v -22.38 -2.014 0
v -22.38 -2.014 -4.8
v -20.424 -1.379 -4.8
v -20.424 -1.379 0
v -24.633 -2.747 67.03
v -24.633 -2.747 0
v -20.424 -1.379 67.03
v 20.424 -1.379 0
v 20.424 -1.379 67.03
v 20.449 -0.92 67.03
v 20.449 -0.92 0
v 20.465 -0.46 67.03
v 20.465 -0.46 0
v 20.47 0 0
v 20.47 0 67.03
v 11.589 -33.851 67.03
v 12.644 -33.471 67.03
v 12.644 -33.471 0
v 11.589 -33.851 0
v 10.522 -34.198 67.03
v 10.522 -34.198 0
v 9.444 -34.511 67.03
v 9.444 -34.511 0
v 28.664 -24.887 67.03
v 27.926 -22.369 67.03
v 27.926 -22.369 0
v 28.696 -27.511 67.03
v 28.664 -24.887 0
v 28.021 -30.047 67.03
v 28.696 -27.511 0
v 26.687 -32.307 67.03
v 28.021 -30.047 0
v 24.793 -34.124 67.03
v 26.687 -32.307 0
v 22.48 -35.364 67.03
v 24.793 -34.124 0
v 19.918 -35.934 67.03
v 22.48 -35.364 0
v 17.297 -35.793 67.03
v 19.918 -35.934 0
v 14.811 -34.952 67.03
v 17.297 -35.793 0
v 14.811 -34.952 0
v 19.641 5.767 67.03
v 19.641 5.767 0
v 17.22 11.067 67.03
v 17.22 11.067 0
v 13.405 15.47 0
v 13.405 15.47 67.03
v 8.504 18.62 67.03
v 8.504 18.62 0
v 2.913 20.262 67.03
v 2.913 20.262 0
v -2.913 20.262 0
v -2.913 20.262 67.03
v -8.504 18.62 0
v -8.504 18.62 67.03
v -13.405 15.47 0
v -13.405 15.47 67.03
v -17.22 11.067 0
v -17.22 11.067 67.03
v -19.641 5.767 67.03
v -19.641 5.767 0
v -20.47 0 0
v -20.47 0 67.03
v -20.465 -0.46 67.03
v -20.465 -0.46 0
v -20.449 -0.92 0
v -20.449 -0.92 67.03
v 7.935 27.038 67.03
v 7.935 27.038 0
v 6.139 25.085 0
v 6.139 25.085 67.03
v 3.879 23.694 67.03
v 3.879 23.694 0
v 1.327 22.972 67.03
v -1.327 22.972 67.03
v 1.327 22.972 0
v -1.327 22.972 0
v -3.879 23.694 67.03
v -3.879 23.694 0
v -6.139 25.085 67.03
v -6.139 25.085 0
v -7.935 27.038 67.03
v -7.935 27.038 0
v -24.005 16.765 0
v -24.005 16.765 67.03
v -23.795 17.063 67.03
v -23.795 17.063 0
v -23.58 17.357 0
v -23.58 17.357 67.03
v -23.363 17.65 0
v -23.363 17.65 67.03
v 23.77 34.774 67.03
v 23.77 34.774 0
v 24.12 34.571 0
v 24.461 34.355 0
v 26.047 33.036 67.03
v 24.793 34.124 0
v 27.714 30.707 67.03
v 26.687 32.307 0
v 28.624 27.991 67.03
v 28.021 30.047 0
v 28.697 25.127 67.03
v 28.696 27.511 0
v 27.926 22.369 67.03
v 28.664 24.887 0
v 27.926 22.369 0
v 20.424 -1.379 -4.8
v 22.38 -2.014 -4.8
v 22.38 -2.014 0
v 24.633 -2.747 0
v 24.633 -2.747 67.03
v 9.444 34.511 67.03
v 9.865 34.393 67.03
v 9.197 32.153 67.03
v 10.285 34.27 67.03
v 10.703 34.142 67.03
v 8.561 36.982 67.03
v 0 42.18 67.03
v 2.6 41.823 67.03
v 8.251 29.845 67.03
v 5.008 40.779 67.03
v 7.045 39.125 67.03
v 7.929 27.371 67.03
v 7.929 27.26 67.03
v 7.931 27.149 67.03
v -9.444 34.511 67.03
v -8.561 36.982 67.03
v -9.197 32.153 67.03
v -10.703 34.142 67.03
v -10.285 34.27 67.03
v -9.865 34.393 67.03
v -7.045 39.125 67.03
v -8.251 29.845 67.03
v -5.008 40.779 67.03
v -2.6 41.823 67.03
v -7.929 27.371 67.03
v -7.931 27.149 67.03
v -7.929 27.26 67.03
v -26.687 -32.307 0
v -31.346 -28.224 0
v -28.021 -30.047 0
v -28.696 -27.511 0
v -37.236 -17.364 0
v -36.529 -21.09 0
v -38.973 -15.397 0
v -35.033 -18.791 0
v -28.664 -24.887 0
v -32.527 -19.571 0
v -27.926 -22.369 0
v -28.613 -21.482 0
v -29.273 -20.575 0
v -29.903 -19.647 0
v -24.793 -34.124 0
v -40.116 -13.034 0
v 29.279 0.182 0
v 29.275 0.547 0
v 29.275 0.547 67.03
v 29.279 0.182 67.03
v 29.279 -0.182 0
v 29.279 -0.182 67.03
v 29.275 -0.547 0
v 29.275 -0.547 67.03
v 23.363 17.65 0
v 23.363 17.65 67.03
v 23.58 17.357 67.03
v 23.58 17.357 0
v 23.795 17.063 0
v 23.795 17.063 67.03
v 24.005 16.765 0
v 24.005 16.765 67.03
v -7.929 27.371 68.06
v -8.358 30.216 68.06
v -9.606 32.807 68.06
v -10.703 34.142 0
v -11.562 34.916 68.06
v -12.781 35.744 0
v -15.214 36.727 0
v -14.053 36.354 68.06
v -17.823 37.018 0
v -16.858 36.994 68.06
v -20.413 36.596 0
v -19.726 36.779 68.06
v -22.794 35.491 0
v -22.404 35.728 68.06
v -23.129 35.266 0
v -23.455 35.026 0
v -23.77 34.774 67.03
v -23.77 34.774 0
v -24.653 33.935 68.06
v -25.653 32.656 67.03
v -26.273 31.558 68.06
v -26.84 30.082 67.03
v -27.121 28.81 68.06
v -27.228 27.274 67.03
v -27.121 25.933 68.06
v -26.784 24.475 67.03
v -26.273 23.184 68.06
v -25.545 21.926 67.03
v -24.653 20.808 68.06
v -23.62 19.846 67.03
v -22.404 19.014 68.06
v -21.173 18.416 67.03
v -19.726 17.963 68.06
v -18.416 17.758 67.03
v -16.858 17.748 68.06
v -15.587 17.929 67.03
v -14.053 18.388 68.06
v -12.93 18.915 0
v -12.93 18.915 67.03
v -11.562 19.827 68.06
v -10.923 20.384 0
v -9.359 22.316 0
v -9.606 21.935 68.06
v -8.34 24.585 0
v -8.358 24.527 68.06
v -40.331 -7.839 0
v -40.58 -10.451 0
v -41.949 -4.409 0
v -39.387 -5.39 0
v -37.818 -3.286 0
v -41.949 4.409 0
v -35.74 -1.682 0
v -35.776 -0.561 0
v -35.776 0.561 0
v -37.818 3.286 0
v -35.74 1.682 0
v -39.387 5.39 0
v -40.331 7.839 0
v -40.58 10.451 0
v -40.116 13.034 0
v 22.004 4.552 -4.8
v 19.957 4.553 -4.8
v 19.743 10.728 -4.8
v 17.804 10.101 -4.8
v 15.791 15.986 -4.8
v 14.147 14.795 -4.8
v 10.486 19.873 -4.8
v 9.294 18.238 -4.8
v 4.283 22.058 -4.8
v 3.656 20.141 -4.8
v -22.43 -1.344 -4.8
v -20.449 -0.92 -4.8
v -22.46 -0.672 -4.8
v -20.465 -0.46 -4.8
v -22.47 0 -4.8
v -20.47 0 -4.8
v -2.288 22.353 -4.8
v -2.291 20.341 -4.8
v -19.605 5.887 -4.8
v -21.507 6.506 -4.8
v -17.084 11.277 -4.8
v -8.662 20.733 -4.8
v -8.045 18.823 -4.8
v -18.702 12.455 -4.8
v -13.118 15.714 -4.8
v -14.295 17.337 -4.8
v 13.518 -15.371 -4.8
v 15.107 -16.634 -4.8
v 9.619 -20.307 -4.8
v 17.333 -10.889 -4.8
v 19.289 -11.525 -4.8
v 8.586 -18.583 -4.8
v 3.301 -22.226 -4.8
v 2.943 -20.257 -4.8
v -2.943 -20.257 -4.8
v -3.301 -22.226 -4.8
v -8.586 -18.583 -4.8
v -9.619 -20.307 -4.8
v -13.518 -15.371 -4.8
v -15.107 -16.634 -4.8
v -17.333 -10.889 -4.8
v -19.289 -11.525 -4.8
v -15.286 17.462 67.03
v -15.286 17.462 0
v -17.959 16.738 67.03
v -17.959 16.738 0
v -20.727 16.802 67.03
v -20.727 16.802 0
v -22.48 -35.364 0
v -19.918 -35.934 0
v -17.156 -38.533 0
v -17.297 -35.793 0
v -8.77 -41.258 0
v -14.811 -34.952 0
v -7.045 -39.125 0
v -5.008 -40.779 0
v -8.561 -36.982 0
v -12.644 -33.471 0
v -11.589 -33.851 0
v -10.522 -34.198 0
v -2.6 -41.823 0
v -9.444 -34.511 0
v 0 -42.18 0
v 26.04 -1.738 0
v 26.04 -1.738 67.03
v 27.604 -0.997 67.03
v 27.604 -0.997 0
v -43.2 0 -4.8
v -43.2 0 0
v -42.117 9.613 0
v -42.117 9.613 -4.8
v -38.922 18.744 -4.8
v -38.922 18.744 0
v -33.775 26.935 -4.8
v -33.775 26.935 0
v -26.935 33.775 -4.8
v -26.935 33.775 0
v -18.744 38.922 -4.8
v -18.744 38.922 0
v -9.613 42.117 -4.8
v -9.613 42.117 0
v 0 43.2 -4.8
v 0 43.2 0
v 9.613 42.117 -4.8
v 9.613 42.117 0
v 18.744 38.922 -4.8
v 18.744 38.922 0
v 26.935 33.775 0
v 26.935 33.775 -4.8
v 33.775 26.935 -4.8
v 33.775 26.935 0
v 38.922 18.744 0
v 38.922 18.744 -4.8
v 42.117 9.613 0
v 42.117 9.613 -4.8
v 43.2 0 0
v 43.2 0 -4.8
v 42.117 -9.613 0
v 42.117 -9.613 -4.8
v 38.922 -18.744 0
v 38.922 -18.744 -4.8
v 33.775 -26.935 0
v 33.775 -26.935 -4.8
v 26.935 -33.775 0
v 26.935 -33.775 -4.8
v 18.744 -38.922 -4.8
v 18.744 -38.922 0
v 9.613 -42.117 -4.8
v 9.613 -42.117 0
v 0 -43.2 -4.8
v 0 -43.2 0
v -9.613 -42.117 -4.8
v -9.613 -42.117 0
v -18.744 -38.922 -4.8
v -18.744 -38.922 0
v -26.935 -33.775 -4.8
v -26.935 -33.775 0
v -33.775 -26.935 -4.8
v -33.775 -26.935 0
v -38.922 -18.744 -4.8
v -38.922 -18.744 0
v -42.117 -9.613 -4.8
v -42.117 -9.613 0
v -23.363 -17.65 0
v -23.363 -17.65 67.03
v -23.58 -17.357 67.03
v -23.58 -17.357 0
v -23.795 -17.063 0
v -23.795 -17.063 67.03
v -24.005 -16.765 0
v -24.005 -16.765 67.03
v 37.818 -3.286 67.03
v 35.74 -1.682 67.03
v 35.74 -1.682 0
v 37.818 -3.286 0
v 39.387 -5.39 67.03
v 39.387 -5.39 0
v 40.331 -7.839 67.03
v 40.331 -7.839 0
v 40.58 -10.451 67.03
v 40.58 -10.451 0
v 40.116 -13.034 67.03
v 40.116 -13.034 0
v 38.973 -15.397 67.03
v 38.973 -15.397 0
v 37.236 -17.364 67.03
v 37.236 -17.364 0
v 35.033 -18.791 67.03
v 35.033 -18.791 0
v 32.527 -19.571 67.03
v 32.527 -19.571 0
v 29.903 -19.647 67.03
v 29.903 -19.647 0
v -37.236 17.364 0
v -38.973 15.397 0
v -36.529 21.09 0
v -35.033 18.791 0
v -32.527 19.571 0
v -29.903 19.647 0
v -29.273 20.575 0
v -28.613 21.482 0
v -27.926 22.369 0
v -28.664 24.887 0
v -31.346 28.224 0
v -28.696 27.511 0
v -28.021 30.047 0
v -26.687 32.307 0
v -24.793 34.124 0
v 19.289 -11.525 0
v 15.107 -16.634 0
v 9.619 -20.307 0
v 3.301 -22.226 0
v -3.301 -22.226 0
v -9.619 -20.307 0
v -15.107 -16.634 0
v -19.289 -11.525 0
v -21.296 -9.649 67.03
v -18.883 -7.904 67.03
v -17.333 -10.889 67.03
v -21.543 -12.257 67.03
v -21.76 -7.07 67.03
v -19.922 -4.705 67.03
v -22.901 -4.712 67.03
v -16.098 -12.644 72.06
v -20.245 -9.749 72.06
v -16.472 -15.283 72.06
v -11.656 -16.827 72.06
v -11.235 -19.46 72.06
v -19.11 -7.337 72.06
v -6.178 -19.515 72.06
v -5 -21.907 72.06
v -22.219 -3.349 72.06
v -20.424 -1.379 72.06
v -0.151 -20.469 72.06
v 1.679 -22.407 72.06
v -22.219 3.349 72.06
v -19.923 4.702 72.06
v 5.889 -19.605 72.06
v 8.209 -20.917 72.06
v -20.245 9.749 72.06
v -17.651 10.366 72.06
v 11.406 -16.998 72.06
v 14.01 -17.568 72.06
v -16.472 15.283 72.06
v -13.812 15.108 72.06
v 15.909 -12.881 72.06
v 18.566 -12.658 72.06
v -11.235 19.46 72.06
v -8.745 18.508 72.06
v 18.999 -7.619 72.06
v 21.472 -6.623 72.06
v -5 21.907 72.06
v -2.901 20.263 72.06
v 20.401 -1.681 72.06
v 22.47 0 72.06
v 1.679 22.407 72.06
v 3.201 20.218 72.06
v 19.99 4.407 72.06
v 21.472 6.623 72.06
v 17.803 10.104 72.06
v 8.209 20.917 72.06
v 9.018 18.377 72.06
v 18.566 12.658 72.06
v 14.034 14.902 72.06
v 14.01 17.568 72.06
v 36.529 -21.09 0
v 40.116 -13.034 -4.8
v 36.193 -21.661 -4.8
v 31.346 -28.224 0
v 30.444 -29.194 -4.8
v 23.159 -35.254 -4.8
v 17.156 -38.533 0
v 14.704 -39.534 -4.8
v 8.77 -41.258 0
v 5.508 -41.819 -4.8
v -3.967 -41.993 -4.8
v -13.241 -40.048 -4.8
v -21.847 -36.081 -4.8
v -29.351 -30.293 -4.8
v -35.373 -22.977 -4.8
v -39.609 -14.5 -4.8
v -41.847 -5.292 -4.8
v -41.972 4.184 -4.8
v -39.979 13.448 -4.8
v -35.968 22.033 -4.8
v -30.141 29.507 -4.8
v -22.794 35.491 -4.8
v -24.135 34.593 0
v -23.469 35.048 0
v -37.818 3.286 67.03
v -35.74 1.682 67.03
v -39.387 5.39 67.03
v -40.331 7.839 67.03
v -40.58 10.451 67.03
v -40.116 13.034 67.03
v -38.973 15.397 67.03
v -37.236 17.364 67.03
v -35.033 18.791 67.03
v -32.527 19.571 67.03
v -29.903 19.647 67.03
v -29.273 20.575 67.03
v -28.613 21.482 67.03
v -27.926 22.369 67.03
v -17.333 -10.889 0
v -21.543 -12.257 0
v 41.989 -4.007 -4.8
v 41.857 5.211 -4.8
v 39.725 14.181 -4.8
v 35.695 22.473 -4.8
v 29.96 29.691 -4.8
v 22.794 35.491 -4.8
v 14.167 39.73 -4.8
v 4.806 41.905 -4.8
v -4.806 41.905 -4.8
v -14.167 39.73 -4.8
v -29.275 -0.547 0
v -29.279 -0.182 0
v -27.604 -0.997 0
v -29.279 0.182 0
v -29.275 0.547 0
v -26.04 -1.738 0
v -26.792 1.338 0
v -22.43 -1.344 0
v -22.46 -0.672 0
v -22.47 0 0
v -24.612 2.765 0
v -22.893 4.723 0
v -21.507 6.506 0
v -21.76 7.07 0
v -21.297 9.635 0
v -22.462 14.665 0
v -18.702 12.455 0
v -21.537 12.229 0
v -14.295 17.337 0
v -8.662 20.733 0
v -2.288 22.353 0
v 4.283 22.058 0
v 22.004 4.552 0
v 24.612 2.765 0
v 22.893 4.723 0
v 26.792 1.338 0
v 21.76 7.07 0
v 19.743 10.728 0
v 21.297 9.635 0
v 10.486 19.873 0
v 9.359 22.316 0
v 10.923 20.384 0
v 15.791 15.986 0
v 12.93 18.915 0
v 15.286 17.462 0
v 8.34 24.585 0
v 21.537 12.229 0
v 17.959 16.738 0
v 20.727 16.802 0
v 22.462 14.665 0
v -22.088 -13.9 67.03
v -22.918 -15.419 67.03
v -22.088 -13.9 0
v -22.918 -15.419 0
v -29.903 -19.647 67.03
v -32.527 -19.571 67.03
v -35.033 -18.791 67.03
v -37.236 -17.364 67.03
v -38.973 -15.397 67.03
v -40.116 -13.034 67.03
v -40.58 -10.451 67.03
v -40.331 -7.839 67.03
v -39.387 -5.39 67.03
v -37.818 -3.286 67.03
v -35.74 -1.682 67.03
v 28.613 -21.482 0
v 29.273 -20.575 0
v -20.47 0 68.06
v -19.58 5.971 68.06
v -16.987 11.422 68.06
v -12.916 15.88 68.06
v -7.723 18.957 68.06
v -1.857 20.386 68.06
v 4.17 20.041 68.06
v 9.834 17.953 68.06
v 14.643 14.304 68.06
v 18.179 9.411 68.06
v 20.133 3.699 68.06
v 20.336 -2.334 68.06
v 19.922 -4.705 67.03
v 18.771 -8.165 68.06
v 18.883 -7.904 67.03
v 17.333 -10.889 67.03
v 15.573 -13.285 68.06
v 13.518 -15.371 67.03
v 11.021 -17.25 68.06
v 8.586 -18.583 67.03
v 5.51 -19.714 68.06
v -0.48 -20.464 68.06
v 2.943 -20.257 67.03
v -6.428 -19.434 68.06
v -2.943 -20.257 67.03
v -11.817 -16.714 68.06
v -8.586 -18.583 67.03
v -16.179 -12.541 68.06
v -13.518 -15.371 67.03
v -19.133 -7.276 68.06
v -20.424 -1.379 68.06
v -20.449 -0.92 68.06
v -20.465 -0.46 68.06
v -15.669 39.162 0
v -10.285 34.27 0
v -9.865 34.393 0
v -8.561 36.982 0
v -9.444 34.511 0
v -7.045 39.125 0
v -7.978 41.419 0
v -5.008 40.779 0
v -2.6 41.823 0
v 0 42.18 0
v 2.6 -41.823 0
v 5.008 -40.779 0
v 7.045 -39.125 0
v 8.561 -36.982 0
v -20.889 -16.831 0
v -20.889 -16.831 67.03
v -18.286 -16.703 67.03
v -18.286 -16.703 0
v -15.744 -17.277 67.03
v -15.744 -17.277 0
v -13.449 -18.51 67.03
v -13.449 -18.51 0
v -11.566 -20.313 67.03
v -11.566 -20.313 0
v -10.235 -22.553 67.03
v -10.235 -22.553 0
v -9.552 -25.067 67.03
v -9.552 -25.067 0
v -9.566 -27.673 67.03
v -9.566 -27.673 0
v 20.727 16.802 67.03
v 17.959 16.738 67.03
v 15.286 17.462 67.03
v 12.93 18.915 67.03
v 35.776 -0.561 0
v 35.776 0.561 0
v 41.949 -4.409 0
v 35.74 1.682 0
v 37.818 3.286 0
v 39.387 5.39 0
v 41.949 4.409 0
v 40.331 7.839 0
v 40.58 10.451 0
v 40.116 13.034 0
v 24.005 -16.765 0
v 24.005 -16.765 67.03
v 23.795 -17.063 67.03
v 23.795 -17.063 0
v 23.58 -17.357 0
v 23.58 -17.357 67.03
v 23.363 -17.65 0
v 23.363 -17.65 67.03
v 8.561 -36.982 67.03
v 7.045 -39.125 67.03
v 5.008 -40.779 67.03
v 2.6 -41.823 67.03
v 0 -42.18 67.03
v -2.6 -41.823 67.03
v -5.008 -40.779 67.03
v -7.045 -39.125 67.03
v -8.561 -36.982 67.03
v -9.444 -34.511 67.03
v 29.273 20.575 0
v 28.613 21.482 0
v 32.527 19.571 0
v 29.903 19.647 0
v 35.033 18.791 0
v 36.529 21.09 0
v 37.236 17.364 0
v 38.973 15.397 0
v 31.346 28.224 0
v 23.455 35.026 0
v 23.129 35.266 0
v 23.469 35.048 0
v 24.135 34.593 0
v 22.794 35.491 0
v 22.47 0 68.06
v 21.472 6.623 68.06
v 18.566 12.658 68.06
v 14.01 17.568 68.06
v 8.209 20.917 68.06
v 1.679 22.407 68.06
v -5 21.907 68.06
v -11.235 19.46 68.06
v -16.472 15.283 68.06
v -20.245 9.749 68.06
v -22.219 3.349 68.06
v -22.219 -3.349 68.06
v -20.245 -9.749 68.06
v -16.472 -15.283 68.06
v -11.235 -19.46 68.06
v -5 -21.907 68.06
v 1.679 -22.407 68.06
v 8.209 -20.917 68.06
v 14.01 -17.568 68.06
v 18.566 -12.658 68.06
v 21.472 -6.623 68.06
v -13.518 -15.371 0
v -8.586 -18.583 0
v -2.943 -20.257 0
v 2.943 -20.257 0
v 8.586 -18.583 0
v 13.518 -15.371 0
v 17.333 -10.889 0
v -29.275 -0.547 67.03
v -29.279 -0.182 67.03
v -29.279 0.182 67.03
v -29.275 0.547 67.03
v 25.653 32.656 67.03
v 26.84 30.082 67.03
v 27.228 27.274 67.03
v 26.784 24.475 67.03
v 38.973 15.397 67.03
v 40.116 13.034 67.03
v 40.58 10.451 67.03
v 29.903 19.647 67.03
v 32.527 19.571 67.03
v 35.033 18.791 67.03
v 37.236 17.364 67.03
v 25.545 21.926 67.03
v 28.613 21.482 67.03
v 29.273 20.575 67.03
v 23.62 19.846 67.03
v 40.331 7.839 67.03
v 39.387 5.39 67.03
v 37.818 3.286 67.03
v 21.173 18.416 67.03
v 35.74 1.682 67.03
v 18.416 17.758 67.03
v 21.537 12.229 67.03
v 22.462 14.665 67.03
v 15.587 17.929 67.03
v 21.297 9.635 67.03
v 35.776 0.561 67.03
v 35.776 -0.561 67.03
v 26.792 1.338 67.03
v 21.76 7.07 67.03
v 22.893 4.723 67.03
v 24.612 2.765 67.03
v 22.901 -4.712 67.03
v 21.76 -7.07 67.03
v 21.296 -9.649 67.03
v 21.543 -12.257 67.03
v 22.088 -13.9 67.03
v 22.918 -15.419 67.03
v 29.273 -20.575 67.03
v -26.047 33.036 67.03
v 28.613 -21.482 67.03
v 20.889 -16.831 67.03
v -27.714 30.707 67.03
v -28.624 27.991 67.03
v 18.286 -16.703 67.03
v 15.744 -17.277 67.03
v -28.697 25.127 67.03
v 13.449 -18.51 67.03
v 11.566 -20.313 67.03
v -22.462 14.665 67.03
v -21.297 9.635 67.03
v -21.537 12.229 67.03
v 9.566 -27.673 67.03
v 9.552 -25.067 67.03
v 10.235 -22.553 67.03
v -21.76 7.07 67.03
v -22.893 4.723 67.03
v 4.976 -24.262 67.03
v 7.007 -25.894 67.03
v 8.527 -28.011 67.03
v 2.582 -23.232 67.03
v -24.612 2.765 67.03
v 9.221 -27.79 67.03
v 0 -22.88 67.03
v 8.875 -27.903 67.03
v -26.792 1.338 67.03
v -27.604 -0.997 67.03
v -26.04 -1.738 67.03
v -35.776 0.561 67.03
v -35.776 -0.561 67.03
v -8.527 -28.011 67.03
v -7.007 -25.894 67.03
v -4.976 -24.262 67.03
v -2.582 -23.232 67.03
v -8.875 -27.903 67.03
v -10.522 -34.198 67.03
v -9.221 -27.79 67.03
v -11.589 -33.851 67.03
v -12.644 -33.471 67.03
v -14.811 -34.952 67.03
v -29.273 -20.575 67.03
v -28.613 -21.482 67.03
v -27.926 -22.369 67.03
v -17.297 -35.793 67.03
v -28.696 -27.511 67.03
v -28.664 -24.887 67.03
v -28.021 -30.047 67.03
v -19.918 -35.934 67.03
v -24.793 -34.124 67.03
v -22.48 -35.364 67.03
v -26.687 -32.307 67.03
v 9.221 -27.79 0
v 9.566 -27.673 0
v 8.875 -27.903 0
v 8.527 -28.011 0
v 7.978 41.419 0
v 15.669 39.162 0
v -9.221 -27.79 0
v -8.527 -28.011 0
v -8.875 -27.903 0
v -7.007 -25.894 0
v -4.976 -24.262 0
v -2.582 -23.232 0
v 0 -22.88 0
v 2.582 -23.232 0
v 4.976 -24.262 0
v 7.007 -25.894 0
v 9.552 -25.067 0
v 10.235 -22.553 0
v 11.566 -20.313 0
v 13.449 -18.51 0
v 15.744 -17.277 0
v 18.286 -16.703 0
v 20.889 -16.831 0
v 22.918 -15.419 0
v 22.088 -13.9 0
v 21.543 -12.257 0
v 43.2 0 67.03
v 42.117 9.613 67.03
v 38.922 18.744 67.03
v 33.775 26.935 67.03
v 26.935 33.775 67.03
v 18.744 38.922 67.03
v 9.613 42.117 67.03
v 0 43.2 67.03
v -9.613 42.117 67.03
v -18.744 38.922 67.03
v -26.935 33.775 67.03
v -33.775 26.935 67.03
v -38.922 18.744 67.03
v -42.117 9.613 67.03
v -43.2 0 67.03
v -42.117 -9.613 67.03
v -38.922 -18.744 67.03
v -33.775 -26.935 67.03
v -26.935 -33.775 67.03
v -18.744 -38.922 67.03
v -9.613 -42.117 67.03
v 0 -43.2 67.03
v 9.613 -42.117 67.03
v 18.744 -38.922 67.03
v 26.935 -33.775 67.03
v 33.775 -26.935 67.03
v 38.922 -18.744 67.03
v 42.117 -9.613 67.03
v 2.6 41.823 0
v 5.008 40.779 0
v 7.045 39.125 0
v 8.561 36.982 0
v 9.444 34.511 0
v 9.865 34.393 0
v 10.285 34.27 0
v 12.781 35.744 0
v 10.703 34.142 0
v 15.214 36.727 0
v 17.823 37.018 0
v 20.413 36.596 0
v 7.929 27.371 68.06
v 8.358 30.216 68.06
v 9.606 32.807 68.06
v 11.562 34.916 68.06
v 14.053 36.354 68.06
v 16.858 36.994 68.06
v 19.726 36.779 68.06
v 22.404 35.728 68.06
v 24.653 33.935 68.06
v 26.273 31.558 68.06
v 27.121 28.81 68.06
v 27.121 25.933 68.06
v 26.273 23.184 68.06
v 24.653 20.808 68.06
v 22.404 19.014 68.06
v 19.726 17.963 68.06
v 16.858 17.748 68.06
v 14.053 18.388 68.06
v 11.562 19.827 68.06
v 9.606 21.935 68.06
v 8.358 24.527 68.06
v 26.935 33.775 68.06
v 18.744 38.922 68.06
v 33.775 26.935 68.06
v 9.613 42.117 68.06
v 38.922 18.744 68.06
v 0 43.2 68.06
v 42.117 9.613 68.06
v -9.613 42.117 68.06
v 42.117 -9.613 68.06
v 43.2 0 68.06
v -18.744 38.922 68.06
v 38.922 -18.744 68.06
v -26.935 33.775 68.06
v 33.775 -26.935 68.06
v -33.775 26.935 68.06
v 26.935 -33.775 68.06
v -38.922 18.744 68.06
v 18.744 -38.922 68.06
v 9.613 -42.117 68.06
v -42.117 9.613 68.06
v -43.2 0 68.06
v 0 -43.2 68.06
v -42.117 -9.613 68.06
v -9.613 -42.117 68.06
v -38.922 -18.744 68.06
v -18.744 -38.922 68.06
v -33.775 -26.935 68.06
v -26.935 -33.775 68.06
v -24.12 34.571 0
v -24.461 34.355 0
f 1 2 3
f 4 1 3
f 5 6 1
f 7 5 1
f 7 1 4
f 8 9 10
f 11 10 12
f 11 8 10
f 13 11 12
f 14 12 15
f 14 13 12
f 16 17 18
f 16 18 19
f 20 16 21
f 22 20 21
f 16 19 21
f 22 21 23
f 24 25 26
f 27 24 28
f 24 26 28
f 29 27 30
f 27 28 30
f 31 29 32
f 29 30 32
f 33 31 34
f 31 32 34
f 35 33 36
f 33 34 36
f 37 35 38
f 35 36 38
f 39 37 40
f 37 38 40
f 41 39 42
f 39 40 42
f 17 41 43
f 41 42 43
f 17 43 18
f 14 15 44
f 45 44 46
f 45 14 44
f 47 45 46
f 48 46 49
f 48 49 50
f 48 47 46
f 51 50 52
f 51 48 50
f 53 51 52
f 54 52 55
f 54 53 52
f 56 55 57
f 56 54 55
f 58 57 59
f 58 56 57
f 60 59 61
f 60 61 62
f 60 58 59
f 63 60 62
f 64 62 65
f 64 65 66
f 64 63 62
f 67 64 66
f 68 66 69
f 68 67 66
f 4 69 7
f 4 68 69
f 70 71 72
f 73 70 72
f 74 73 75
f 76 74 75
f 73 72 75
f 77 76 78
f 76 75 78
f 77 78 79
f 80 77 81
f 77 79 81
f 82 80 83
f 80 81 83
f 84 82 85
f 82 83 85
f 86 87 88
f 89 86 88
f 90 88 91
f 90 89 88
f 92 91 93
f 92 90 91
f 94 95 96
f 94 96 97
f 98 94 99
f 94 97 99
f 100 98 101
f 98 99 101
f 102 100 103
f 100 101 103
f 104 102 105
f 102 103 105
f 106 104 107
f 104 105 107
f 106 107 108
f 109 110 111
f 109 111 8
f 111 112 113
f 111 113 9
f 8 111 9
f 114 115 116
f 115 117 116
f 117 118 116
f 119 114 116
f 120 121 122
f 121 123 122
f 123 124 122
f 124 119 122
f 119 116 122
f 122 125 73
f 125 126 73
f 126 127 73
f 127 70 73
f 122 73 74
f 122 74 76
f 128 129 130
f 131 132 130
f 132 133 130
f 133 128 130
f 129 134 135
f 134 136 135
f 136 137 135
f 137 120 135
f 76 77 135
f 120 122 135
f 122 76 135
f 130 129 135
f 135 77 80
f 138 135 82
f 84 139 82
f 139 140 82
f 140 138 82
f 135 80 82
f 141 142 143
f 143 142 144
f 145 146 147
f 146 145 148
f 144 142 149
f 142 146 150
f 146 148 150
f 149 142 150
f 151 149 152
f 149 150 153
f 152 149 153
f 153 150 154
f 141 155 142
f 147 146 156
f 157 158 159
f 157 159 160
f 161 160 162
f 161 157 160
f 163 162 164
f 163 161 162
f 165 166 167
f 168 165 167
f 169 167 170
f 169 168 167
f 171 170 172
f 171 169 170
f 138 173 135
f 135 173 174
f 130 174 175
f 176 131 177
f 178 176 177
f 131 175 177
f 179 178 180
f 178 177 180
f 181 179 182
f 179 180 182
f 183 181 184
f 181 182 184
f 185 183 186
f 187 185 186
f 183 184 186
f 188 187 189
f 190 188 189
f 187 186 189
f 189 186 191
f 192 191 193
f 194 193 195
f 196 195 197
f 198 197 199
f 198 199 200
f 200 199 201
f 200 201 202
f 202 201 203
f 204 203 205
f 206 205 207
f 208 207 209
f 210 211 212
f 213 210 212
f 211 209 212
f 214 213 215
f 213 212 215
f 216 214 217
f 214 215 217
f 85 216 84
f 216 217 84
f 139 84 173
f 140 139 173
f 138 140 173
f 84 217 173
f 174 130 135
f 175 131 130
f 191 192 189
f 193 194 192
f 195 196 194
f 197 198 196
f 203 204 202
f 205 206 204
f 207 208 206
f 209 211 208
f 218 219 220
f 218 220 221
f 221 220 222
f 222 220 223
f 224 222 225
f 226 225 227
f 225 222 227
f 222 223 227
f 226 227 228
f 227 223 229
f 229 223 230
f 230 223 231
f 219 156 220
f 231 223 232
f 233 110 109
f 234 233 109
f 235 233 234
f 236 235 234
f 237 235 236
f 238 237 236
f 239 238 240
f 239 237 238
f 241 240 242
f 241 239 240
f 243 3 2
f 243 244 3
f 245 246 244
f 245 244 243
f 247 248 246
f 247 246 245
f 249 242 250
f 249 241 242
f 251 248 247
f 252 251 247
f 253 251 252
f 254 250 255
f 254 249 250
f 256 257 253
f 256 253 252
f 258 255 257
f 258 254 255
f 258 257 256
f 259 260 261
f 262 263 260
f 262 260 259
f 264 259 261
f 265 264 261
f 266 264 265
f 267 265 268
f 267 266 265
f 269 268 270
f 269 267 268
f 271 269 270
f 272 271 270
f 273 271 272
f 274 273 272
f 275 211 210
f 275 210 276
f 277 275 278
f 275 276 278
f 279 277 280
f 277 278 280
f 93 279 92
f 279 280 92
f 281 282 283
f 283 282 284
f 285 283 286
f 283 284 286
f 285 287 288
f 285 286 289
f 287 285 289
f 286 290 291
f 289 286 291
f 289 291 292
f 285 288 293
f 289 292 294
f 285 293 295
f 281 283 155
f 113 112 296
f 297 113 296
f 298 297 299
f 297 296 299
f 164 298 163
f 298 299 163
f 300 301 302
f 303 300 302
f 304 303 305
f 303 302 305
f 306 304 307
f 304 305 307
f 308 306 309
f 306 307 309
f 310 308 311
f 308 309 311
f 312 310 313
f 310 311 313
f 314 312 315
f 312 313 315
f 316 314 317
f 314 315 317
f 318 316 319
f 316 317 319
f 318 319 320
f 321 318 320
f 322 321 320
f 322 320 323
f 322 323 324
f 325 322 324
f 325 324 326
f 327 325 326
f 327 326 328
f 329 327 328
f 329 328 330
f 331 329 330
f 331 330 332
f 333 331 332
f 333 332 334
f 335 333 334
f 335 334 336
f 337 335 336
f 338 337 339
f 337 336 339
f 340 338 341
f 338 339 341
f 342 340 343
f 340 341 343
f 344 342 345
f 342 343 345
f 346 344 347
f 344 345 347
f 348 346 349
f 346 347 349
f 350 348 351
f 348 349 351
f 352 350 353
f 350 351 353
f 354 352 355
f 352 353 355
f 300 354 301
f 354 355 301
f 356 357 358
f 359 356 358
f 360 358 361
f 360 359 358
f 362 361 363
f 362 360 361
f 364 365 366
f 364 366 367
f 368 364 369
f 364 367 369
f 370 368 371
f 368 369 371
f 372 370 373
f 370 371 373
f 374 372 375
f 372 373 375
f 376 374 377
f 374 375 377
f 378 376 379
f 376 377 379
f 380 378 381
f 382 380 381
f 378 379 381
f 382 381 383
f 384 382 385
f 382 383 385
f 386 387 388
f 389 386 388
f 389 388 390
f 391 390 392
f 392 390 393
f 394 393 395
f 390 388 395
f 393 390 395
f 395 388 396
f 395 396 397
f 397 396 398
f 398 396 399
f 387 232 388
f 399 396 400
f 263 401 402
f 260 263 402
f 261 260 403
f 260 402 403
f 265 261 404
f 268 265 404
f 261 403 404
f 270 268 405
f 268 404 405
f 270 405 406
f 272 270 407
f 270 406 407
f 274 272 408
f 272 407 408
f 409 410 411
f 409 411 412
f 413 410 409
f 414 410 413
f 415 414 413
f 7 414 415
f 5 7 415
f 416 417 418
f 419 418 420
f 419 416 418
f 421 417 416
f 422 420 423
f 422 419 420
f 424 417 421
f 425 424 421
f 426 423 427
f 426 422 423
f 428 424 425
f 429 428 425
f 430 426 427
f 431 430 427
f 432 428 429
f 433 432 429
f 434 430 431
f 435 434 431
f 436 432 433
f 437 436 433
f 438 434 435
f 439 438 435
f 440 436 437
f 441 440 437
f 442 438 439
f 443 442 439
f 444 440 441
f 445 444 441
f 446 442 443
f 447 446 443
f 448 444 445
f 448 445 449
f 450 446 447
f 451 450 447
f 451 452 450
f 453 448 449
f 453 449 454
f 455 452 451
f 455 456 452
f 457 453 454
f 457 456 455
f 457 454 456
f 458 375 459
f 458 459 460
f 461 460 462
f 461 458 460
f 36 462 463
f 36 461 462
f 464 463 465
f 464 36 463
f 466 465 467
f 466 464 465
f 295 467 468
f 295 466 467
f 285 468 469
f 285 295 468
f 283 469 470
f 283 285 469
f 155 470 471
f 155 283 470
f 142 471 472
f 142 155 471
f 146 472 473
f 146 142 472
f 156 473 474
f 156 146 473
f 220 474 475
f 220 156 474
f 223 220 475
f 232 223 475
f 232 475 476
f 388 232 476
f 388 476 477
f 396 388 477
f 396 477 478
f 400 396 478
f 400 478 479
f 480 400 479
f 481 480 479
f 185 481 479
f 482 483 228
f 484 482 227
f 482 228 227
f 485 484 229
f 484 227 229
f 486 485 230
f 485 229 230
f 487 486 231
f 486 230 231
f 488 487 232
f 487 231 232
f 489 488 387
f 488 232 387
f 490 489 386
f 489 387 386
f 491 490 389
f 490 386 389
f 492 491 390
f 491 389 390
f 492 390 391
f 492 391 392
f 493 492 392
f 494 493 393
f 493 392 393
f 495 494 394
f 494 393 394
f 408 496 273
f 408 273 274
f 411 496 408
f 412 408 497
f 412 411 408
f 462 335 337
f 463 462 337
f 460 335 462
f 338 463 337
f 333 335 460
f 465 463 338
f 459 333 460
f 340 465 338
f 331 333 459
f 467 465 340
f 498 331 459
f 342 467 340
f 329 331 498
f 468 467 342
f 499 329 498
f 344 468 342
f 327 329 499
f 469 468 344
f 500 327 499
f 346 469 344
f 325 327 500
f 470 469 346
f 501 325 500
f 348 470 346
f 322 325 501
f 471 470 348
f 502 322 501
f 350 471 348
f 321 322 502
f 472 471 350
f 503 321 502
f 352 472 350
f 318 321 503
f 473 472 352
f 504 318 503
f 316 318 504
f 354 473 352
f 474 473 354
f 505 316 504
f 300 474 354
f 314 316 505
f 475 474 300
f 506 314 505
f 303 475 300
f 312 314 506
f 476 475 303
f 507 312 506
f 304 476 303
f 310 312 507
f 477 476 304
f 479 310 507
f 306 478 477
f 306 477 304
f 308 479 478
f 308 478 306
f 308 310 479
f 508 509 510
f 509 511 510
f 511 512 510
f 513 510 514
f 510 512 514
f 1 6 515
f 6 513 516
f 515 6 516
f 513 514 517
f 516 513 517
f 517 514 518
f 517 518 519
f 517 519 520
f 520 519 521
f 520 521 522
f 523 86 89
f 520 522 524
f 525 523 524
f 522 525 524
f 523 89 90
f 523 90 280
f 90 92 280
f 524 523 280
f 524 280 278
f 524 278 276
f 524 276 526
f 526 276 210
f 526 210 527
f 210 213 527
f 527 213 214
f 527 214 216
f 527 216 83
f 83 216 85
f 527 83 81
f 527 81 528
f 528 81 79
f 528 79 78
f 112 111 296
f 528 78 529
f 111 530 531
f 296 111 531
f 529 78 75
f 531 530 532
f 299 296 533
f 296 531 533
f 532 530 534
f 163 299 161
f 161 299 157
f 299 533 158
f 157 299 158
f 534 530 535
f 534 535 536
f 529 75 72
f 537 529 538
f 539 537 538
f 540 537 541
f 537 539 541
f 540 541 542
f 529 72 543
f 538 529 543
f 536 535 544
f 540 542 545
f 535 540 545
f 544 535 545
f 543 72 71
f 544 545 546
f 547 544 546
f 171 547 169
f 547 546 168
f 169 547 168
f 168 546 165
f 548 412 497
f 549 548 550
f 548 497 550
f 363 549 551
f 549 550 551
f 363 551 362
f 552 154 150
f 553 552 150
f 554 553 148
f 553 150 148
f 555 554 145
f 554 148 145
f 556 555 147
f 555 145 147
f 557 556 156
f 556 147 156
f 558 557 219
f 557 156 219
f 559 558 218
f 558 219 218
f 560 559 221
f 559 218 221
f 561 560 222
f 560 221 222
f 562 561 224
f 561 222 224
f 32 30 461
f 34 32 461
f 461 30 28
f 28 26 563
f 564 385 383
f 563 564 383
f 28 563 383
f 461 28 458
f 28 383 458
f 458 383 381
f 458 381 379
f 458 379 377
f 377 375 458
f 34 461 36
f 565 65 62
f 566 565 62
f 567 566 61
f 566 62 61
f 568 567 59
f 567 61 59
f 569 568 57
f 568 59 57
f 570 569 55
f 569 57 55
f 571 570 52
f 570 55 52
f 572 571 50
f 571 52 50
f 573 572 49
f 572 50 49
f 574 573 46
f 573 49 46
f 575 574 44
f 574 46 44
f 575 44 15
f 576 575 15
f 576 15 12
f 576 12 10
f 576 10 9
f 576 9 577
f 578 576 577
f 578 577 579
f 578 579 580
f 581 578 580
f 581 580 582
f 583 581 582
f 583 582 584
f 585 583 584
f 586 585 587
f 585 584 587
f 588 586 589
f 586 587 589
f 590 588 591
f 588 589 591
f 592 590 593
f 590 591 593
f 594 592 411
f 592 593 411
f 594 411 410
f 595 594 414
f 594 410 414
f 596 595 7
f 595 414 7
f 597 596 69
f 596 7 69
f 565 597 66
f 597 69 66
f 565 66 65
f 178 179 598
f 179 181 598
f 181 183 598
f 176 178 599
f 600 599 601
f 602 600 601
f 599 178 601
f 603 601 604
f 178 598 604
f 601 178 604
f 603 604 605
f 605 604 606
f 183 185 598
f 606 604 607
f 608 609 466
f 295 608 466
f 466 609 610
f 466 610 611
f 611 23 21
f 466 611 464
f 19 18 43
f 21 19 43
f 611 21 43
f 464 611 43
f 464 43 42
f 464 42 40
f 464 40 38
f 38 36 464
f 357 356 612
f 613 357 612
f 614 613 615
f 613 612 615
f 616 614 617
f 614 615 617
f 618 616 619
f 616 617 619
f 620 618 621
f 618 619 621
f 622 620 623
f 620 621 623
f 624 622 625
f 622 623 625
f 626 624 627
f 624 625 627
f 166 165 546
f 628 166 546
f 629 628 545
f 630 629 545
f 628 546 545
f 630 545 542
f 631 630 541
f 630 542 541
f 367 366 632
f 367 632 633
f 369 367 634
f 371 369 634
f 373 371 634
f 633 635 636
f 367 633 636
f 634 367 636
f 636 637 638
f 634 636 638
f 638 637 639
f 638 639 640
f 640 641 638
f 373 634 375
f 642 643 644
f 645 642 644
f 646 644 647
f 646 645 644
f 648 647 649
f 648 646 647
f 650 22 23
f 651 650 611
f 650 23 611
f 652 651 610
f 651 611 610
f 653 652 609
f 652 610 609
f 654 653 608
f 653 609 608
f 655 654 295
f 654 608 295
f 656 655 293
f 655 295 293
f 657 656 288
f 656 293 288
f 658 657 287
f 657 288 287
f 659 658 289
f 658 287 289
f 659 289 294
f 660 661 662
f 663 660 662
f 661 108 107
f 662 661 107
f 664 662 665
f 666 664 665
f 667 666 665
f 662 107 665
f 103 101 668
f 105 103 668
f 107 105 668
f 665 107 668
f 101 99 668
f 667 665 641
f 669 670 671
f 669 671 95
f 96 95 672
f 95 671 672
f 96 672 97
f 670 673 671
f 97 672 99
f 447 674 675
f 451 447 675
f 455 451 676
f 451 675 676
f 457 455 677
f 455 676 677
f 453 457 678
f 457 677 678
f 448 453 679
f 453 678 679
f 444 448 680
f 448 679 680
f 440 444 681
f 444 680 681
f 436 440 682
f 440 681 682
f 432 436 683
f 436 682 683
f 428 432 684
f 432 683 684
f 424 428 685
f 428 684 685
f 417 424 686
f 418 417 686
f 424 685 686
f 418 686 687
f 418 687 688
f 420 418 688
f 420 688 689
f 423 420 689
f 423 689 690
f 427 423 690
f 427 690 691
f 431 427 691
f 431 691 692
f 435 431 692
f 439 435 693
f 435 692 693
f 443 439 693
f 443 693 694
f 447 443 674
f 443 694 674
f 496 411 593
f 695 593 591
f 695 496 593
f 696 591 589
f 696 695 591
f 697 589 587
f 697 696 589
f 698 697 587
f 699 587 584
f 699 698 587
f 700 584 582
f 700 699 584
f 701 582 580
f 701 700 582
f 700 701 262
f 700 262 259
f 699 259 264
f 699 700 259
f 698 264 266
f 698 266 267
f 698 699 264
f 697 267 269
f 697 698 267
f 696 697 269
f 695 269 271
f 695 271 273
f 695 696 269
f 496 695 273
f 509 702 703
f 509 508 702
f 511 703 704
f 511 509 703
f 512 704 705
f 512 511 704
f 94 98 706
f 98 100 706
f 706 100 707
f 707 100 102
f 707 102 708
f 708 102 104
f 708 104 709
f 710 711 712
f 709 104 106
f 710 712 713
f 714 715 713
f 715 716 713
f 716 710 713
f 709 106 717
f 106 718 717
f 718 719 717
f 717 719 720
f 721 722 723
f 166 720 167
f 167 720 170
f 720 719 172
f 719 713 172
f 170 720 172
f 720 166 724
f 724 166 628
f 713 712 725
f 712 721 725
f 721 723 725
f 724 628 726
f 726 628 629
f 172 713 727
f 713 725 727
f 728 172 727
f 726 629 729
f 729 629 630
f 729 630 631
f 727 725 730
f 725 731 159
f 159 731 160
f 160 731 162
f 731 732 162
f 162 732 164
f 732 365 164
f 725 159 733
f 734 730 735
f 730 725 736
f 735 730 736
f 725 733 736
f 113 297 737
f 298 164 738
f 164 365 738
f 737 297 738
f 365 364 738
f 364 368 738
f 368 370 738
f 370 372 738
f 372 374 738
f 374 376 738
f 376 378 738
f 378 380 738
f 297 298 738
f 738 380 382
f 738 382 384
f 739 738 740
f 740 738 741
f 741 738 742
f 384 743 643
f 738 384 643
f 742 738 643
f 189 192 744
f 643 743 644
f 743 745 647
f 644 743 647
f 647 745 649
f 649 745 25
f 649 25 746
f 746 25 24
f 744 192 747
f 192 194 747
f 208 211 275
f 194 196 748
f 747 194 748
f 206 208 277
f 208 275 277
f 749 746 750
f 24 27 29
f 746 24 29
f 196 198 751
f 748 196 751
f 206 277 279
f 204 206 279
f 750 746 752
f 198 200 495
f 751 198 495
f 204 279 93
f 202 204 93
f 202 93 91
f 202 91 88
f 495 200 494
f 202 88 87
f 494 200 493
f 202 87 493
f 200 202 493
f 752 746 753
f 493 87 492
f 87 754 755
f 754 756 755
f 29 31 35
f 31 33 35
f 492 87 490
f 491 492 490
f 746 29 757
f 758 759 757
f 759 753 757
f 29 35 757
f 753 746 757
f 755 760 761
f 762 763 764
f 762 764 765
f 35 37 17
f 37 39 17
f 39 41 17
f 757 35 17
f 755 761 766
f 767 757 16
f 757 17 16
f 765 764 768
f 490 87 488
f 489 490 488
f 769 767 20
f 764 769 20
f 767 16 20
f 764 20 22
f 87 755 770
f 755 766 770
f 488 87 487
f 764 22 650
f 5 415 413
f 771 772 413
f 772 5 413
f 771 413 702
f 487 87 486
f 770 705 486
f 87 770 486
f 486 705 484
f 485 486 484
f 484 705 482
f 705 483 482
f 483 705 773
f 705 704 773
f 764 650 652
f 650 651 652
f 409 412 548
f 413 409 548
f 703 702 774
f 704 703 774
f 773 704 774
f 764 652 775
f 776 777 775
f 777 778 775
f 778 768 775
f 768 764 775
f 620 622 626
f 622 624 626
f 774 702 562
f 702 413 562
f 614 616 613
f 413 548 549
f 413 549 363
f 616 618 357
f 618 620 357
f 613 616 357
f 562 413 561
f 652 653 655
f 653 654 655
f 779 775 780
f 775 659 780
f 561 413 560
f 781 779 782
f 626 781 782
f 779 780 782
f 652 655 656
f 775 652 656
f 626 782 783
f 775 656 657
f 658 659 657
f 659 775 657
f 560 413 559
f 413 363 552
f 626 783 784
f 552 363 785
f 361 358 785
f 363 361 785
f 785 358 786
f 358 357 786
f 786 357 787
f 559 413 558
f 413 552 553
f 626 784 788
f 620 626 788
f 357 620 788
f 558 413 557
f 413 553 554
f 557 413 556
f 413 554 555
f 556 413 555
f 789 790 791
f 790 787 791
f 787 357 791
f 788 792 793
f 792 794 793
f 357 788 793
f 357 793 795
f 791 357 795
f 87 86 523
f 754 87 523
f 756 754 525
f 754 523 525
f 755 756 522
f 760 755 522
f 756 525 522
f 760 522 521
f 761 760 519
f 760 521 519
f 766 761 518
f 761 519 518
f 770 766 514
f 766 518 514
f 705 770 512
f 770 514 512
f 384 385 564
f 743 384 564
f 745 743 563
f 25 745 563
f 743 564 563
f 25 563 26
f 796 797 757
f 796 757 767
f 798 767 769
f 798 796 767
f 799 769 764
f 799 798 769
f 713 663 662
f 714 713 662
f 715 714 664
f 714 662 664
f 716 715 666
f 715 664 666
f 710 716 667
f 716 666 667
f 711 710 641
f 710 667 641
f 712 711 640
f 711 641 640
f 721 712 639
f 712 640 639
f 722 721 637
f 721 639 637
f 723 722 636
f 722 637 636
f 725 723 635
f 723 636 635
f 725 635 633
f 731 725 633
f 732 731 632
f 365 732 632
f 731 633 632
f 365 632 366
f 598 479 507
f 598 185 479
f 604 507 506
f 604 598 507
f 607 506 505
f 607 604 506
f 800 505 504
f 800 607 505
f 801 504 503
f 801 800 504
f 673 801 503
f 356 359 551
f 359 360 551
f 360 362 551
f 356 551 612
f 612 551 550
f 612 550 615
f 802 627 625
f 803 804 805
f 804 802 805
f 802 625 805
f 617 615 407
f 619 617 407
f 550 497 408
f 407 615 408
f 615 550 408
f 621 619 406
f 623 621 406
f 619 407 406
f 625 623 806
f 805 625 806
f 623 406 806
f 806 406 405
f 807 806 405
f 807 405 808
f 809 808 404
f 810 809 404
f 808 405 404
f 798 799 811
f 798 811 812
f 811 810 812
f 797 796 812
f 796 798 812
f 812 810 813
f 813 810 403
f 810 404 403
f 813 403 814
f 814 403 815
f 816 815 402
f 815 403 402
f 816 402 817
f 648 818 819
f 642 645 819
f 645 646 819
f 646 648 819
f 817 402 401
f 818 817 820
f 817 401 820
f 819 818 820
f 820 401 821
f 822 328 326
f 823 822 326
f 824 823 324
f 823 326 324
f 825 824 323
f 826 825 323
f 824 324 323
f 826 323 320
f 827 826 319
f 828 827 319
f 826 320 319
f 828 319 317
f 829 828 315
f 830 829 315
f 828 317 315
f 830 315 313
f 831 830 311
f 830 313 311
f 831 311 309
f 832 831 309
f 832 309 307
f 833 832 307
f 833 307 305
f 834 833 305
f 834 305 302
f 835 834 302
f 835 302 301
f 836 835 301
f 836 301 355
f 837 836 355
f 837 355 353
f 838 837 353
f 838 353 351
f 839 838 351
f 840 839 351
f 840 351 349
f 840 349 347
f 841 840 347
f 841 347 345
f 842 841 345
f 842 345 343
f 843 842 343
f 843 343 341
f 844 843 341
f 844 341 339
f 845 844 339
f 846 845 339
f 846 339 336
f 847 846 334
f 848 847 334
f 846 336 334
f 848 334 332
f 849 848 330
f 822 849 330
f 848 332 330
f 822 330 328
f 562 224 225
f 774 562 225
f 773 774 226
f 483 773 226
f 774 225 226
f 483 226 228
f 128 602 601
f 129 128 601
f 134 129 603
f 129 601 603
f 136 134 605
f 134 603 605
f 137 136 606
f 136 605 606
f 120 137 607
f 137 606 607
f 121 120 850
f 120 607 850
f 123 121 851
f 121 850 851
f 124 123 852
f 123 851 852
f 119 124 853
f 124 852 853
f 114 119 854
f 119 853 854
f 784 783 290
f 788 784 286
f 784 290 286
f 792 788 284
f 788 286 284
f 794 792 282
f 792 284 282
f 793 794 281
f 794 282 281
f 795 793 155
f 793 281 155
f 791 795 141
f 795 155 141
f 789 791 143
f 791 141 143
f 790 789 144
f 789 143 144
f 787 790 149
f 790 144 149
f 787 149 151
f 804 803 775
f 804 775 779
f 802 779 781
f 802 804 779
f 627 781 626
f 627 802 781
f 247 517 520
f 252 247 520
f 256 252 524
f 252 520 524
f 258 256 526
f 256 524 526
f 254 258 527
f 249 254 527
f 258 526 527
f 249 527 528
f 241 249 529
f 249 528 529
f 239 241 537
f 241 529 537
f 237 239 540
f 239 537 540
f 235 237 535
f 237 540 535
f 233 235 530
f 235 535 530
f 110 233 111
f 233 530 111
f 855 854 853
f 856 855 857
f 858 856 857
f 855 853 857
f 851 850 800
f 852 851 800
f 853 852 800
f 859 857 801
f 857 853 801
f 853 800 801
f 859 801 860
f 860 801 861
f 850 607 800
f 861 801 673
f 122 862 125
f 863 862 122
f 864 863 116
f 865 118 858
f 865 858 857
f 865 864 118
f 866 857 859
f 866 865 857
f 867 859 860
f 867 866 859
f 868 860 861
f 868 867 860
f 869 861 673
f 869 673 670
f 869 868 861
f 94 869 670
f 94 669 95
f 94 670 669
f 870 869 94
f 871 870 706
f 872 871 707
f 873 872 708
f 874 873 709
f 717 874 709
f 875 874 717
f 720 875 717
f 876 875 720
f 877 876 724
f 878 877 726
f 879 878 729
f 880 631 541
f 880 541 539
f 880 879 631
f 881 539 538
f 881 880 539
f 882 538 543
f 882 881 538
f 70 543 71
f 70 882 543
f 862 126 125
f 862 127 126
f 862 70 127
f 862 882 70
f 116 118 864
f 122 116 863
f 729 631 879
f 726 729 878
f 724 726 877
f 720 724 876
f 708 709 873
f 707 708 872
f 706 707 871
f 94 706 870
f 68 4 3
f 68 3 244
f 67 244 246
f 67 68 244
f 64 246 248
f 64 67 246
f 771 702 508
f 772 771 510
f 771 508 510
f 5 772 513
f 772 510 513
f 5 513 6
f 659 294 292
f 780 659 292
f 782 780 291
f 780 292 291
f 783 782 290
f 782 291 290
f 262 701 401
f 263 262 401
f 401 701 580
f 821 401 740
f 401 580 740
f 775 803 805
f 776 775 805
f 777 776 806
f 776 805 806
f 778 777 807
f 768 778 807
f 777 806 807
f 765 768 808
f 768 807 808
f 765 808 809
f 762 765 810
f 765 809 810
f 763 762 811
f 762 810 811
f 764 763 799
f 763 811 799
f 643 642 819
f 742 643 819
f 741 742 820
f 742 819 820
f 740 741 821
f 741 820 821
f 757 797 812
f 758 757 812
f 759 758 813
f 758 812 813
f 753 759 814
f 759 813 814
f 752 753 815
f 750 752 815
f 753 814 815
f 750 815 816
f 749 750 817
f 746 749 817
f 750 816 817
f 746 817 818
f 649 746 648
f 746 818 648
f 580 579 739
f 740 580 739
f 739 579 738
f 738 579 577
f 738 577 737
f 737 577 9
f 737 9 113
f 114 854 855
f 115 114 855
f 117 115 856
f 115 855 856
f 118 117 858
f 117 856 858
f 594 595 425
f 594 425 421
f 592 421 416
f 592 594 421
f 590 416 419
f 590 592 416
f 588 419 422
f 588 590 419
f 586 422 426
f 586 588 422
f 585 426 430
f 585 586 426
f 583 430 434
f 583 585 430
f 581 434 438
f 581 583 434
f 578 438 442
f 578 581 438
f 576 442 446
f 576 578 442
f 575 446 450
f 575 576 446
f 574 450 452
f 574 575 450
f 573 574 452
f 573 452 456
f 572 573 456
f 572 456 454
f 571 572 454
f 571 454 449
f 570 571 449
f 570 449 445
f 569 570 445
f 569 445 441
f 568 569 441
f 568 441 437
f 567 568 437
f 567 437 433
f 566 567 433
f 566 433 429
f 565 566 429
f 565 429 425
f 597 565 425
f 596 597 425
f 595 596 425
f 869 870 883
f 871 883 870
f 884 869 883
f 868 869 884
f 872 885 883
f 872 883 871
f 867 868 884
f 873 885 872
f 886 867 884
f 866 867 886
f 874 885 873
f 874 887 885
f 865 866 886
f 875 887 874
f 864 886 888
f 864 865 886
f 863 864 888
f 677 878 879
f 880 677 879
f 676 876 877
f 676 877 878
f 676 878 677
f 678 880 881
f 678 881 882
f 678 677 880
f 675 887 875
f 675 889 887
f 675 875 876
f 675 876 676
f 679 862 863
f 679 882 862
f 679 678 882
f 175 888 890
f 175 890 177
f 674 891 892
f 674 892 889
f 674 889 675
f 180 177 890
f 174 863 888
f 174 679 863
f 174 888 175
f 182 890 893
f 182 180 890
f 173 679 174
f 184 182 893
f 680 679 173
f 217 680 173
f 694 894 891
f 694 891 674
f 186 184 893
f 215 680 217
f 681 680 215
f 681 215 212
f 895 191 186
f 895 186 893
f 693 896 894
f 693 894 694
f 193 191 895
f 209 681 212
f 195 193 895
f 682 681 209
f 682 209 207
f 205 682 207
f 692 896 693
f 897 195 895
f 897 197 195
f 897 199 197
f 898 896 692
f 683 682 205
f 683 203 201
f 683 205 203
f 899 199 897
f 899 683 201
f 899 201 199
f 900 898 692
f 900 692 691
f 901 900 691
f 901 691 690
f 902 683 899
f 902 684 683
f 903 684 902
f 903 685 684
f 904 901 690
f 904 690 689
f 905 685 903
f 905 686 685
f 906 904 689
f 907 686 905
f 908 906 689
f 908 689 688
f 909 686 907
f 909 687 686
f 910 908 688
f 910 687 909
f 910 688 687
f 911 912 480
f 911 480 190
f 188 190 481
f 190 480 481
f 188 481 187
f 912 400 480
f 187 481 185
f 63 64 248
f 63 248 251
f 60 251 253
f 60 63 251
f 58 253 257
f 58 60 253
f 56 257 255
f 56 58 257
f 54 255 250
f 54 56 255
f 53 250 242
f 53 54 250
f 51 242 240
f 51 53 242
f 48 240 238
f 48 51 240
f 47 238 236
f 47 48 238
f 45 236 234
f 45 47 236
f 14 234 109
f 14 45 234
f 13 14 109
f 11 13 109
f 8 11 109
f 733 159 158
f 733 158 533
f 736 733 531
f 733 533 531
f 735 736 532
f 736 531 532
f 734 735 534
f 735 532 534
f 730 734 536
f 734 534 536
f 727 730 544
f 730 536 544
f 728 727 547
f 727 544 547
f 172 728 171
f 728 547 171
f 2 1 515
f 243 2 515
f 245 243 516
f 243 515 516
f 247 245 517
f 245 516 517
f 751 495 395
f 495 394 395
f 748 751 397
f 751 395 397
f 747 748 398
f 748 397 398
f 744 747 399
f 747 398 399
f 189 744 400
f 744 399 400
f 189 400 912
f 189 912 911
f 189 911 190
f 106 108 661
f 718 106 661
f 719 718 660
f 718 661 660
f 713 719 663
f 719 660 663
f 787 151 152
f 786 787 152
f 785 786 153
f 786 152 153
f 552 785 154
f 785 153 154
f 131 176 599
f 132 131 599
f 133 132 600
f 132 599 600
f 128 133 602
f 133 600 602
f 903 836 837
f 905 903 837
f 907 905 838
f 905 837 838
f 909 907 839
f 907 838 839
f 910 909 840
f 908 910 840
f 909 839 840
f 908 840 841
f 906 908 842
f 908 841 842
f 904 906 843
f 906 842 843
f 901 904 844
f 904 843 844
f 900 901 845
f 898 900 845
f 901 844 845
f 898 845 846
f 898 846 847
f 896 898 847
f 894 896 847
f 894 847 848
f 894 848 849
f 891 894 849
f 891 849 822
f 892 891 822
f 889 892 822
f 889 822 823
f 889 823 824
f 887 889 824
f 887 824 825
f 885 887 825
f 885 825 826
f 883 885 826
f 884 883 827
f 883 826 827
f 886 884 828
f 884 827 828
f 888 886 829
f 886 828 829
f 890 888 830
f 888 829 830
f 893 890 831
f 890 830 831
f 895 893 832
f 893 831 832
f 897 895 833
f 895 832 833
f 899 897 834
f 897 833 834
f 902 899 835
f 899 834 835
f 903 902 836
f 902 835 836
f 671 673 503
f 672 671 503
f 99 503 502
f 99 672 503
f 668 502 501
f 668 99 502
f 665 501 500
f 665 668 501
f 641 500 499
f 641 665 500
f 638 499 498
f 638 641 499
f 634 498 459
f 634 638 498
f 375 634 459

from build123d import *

# Parameters (mm, degrees)
SKETCH1_R                  = 43.2
SKETCH1_R_2                = 20.47
BASIC_SHAPE_DEPTH          = 67.03
SKETCH2_R                  = 9.65
BATTERY_SLOT_DEPTH         = 67.03
BATTERY_SLOT_PATTERN_COUNT = 10
SKETCH4_R                  = 35.78
SKETCH4_R_2                = 29.28
BUS_SLOT_DEPTH             = 67.03
SKETCH5_R                  = 43.2
SKETCH5_R_2                = 42.18
SKETCH5_R_3                = 22.47
SKETCH5_R_4                = 20.47
BOTTOM_LIP_DEPTH           = 4.8
SKETCH6_R                  = 43.2
TOP_CAP_DEPTH              = 1.03
SKETCH7_R                  = 9.65
PENNY_HOLE_DEPTH           = 96.084486642
WIRE_START                 = -67.03
WIRE_SLIT_DEPTH            = 159.488425528
SKETCH9_R                  = 20.47
RE_CUT_BASIC_SHAPE_DEPTH   = 95.297555111
SKETCH10_R                 = 22.47
SKETCH10_R_2               = 20.47
TOP_LIP_DEPTH              = 4


with BuildPart() as part:
    # Sketch1 → Basic Shape (new body)
    with BuildSketch(Plane.XY):
        Circle(SKETCH1_R)
        Circle(SKETCH1_R_2, mode=Mode.SUBTRACT)
    extrude(amount=BASIC_SHAPE_DEPTH)

    # Sketch2 → Battery Slot (cut)
    with BuildSketch(Plane(origin=(0, 0, 0), x_dir=(-1, 0, 0), z_dir=(0, 0, -1))):
        with Locations((0, -32.53)):
            Circle(SKETCH2_R)
    battery_slot = extrude(amount=-BATTERY_SLOT_DEPTH, mode=Mode.SUBTRACT)

    # Battery Slot Pattern: Battery Slot ×10 about axis
    battery_slot_pattern_axis = Axis((0, 0, 0), (0, 0, 1))
    for i in range(1, BATTERY_SLOT_PATTERN_COUNT):
        add(battery_slot.rotate(battery_slot_pattern_axis, i * 360 / BATTERY_SLOT_PATTERN_COUNT), mode=Mode.SUBTRACT)

    # Sketch4 → Bus Slot (cut)
    with BuildSketch(Plane(origin=(0, 0, 0), x_dir=(-1, 0, 0), z_dir=(0, 0, -1))):
        Circle(SKETCH4_R)
        Circle(SKETCH4_R_2, mode=Mode.SUBTRACT)
    extrude(amount=-BUS_SLOT_DEPTH, mode=Mode.SUBTRACT)


with BuildPart() as bus_slot_piece_1:
    # of the separate pieces the step leaves, piece 1, a body of its own (bus_slot_pieces)
    add(part.part.solids().sort_by_distance((43.2, 0, 0))[0])



with BuildPart() as bus_slot_piece_2:
    # of the separate pieces the step leaves, piece 2, a body of its own (bus_slot_pieces)
    add(part.part.solids().sort_by_distance((-8.526505578, -28.011017522, 0))[0])


with BuildPart() as bus_slot_piece_1_1:
    add(bus_slot_piece_1.part)

    add(bus_slot_piece_2.part)  # Bottom Lip merges Bus Slot piece 2
    # Sketch5 → Bottom Lip (add)
    # profile 1 of 2: a face of its own
    with BuildSketch(Plane(origin=(0, 0, 0), x_dir=(-1, 0, 0), z_dir=(0, 0, -1))):
        Circle(SKETCH5_R)
        with Locations(Location((0, 0, 0), (0, 0, 198))):
            Circle(SKETCH5_R_2, mode=Mode.SUBTRACT)
    # profile 2 of 2: a face of its own
    with BuildSketch(Plane(origin=(0, 0, 0), x_dir=(-1, 0, 0), z_dir=(0, 0, -1))):
        Circle(SKETCH5_R_3)
        Circle(SKETCH5_R_4, mode=Mode.SUBTRACT)
    extrude(amount=BOTTOM_LIP_DEPTH)

    # Sketch6 → Top Cap (add)
    with BuildSketch(Plane.XY.offset(67.03)):
        with Locations(Location((0, 0, 0), (0, 0, 180))):
            Circle(SKETCH6_R)
    extrude(amount=TOP_CAP_DEPTH)

    # Sketch7 → Penny Hole (cut, through all)
    with BuildSketch(Plane.XY.offset(68.06)):
        with Locations((-17.578795082, 27.371278075)):
            Circle(SKETCH7_R)
    penny_hole = extrude(amount=-PENNY_HOLE_DEPTH, mode=Mode.SUBTRACT)

    # Penny Hole Mirror: Penny Hole across plane
    add(penny_hole.mirror(Plane(origin=(0, 0, 0), x_dir=(0, 0, 1), z_dir=(1, 0, 0))), mode=Mode.SUBTRACT)

    # Sketch8 → Wire Slit (cut)
    with BuildSketch(Plane(origin=(0, 0, 0), x_dir=(-1, 0, 0), z_dir=(0, 0, -1)).offset(WIRE_START)):
        with BuildLine():
            Line((-24.633279562, -2.746526591), (-7.790722211, 2.725952027))
            Line((-7.790722211, 2.725952027), (-4.700552267, -6.784613136))
            Line((-4.700552267, -6.784613136), (-21.543109618, -12.257091754))
            ThreePointArc((-21.543109618, -12.257091754), (-21.760173093, -7.070308831), (-24.633279562, -2.746526591))
        make_face()
    wire_slit = extrude(amount=WIRE_SLIT_DEPTH, mode=Mode.SUBTRACT)

    # Wire Slit Mirror: Wire Slit across plane
    add(wire_slit.mirror(Plane(origin=(0, 0, 0), x_dir=(0, 0, 1), z_dir=(1, 0, 0))), mode=Mode.SUBTRACT)

    # Sketch9 → Re-Cut Basic Shape (cut, through all)
    with BuildSketch(Plane(origin=(0, 0, 67.03), x_dir=(-1, 0, 0), z_dir=(0, 0, -1))):
        Circle(SKETCH9_R)
    extrude(amount=-RE_CUT_BASIC_SHAPE_DEPTH, mode=Mode.SUBTRACT)

    # Sketch10 → Top Lip (add)
    with BuildSketch(Plane.XY.offset(68.06)):
        Circle(SKETCH10_R)
        with Locations(Location((0, 0, 0), (0, 0, 183.861900093))):
            Circle(SKETCH10_R_2, mode=Mode.SUBTRACT)
    extrude(amount=TOP_LIP_DEPTH)


solid = bus_slot_piece_1_1.part
